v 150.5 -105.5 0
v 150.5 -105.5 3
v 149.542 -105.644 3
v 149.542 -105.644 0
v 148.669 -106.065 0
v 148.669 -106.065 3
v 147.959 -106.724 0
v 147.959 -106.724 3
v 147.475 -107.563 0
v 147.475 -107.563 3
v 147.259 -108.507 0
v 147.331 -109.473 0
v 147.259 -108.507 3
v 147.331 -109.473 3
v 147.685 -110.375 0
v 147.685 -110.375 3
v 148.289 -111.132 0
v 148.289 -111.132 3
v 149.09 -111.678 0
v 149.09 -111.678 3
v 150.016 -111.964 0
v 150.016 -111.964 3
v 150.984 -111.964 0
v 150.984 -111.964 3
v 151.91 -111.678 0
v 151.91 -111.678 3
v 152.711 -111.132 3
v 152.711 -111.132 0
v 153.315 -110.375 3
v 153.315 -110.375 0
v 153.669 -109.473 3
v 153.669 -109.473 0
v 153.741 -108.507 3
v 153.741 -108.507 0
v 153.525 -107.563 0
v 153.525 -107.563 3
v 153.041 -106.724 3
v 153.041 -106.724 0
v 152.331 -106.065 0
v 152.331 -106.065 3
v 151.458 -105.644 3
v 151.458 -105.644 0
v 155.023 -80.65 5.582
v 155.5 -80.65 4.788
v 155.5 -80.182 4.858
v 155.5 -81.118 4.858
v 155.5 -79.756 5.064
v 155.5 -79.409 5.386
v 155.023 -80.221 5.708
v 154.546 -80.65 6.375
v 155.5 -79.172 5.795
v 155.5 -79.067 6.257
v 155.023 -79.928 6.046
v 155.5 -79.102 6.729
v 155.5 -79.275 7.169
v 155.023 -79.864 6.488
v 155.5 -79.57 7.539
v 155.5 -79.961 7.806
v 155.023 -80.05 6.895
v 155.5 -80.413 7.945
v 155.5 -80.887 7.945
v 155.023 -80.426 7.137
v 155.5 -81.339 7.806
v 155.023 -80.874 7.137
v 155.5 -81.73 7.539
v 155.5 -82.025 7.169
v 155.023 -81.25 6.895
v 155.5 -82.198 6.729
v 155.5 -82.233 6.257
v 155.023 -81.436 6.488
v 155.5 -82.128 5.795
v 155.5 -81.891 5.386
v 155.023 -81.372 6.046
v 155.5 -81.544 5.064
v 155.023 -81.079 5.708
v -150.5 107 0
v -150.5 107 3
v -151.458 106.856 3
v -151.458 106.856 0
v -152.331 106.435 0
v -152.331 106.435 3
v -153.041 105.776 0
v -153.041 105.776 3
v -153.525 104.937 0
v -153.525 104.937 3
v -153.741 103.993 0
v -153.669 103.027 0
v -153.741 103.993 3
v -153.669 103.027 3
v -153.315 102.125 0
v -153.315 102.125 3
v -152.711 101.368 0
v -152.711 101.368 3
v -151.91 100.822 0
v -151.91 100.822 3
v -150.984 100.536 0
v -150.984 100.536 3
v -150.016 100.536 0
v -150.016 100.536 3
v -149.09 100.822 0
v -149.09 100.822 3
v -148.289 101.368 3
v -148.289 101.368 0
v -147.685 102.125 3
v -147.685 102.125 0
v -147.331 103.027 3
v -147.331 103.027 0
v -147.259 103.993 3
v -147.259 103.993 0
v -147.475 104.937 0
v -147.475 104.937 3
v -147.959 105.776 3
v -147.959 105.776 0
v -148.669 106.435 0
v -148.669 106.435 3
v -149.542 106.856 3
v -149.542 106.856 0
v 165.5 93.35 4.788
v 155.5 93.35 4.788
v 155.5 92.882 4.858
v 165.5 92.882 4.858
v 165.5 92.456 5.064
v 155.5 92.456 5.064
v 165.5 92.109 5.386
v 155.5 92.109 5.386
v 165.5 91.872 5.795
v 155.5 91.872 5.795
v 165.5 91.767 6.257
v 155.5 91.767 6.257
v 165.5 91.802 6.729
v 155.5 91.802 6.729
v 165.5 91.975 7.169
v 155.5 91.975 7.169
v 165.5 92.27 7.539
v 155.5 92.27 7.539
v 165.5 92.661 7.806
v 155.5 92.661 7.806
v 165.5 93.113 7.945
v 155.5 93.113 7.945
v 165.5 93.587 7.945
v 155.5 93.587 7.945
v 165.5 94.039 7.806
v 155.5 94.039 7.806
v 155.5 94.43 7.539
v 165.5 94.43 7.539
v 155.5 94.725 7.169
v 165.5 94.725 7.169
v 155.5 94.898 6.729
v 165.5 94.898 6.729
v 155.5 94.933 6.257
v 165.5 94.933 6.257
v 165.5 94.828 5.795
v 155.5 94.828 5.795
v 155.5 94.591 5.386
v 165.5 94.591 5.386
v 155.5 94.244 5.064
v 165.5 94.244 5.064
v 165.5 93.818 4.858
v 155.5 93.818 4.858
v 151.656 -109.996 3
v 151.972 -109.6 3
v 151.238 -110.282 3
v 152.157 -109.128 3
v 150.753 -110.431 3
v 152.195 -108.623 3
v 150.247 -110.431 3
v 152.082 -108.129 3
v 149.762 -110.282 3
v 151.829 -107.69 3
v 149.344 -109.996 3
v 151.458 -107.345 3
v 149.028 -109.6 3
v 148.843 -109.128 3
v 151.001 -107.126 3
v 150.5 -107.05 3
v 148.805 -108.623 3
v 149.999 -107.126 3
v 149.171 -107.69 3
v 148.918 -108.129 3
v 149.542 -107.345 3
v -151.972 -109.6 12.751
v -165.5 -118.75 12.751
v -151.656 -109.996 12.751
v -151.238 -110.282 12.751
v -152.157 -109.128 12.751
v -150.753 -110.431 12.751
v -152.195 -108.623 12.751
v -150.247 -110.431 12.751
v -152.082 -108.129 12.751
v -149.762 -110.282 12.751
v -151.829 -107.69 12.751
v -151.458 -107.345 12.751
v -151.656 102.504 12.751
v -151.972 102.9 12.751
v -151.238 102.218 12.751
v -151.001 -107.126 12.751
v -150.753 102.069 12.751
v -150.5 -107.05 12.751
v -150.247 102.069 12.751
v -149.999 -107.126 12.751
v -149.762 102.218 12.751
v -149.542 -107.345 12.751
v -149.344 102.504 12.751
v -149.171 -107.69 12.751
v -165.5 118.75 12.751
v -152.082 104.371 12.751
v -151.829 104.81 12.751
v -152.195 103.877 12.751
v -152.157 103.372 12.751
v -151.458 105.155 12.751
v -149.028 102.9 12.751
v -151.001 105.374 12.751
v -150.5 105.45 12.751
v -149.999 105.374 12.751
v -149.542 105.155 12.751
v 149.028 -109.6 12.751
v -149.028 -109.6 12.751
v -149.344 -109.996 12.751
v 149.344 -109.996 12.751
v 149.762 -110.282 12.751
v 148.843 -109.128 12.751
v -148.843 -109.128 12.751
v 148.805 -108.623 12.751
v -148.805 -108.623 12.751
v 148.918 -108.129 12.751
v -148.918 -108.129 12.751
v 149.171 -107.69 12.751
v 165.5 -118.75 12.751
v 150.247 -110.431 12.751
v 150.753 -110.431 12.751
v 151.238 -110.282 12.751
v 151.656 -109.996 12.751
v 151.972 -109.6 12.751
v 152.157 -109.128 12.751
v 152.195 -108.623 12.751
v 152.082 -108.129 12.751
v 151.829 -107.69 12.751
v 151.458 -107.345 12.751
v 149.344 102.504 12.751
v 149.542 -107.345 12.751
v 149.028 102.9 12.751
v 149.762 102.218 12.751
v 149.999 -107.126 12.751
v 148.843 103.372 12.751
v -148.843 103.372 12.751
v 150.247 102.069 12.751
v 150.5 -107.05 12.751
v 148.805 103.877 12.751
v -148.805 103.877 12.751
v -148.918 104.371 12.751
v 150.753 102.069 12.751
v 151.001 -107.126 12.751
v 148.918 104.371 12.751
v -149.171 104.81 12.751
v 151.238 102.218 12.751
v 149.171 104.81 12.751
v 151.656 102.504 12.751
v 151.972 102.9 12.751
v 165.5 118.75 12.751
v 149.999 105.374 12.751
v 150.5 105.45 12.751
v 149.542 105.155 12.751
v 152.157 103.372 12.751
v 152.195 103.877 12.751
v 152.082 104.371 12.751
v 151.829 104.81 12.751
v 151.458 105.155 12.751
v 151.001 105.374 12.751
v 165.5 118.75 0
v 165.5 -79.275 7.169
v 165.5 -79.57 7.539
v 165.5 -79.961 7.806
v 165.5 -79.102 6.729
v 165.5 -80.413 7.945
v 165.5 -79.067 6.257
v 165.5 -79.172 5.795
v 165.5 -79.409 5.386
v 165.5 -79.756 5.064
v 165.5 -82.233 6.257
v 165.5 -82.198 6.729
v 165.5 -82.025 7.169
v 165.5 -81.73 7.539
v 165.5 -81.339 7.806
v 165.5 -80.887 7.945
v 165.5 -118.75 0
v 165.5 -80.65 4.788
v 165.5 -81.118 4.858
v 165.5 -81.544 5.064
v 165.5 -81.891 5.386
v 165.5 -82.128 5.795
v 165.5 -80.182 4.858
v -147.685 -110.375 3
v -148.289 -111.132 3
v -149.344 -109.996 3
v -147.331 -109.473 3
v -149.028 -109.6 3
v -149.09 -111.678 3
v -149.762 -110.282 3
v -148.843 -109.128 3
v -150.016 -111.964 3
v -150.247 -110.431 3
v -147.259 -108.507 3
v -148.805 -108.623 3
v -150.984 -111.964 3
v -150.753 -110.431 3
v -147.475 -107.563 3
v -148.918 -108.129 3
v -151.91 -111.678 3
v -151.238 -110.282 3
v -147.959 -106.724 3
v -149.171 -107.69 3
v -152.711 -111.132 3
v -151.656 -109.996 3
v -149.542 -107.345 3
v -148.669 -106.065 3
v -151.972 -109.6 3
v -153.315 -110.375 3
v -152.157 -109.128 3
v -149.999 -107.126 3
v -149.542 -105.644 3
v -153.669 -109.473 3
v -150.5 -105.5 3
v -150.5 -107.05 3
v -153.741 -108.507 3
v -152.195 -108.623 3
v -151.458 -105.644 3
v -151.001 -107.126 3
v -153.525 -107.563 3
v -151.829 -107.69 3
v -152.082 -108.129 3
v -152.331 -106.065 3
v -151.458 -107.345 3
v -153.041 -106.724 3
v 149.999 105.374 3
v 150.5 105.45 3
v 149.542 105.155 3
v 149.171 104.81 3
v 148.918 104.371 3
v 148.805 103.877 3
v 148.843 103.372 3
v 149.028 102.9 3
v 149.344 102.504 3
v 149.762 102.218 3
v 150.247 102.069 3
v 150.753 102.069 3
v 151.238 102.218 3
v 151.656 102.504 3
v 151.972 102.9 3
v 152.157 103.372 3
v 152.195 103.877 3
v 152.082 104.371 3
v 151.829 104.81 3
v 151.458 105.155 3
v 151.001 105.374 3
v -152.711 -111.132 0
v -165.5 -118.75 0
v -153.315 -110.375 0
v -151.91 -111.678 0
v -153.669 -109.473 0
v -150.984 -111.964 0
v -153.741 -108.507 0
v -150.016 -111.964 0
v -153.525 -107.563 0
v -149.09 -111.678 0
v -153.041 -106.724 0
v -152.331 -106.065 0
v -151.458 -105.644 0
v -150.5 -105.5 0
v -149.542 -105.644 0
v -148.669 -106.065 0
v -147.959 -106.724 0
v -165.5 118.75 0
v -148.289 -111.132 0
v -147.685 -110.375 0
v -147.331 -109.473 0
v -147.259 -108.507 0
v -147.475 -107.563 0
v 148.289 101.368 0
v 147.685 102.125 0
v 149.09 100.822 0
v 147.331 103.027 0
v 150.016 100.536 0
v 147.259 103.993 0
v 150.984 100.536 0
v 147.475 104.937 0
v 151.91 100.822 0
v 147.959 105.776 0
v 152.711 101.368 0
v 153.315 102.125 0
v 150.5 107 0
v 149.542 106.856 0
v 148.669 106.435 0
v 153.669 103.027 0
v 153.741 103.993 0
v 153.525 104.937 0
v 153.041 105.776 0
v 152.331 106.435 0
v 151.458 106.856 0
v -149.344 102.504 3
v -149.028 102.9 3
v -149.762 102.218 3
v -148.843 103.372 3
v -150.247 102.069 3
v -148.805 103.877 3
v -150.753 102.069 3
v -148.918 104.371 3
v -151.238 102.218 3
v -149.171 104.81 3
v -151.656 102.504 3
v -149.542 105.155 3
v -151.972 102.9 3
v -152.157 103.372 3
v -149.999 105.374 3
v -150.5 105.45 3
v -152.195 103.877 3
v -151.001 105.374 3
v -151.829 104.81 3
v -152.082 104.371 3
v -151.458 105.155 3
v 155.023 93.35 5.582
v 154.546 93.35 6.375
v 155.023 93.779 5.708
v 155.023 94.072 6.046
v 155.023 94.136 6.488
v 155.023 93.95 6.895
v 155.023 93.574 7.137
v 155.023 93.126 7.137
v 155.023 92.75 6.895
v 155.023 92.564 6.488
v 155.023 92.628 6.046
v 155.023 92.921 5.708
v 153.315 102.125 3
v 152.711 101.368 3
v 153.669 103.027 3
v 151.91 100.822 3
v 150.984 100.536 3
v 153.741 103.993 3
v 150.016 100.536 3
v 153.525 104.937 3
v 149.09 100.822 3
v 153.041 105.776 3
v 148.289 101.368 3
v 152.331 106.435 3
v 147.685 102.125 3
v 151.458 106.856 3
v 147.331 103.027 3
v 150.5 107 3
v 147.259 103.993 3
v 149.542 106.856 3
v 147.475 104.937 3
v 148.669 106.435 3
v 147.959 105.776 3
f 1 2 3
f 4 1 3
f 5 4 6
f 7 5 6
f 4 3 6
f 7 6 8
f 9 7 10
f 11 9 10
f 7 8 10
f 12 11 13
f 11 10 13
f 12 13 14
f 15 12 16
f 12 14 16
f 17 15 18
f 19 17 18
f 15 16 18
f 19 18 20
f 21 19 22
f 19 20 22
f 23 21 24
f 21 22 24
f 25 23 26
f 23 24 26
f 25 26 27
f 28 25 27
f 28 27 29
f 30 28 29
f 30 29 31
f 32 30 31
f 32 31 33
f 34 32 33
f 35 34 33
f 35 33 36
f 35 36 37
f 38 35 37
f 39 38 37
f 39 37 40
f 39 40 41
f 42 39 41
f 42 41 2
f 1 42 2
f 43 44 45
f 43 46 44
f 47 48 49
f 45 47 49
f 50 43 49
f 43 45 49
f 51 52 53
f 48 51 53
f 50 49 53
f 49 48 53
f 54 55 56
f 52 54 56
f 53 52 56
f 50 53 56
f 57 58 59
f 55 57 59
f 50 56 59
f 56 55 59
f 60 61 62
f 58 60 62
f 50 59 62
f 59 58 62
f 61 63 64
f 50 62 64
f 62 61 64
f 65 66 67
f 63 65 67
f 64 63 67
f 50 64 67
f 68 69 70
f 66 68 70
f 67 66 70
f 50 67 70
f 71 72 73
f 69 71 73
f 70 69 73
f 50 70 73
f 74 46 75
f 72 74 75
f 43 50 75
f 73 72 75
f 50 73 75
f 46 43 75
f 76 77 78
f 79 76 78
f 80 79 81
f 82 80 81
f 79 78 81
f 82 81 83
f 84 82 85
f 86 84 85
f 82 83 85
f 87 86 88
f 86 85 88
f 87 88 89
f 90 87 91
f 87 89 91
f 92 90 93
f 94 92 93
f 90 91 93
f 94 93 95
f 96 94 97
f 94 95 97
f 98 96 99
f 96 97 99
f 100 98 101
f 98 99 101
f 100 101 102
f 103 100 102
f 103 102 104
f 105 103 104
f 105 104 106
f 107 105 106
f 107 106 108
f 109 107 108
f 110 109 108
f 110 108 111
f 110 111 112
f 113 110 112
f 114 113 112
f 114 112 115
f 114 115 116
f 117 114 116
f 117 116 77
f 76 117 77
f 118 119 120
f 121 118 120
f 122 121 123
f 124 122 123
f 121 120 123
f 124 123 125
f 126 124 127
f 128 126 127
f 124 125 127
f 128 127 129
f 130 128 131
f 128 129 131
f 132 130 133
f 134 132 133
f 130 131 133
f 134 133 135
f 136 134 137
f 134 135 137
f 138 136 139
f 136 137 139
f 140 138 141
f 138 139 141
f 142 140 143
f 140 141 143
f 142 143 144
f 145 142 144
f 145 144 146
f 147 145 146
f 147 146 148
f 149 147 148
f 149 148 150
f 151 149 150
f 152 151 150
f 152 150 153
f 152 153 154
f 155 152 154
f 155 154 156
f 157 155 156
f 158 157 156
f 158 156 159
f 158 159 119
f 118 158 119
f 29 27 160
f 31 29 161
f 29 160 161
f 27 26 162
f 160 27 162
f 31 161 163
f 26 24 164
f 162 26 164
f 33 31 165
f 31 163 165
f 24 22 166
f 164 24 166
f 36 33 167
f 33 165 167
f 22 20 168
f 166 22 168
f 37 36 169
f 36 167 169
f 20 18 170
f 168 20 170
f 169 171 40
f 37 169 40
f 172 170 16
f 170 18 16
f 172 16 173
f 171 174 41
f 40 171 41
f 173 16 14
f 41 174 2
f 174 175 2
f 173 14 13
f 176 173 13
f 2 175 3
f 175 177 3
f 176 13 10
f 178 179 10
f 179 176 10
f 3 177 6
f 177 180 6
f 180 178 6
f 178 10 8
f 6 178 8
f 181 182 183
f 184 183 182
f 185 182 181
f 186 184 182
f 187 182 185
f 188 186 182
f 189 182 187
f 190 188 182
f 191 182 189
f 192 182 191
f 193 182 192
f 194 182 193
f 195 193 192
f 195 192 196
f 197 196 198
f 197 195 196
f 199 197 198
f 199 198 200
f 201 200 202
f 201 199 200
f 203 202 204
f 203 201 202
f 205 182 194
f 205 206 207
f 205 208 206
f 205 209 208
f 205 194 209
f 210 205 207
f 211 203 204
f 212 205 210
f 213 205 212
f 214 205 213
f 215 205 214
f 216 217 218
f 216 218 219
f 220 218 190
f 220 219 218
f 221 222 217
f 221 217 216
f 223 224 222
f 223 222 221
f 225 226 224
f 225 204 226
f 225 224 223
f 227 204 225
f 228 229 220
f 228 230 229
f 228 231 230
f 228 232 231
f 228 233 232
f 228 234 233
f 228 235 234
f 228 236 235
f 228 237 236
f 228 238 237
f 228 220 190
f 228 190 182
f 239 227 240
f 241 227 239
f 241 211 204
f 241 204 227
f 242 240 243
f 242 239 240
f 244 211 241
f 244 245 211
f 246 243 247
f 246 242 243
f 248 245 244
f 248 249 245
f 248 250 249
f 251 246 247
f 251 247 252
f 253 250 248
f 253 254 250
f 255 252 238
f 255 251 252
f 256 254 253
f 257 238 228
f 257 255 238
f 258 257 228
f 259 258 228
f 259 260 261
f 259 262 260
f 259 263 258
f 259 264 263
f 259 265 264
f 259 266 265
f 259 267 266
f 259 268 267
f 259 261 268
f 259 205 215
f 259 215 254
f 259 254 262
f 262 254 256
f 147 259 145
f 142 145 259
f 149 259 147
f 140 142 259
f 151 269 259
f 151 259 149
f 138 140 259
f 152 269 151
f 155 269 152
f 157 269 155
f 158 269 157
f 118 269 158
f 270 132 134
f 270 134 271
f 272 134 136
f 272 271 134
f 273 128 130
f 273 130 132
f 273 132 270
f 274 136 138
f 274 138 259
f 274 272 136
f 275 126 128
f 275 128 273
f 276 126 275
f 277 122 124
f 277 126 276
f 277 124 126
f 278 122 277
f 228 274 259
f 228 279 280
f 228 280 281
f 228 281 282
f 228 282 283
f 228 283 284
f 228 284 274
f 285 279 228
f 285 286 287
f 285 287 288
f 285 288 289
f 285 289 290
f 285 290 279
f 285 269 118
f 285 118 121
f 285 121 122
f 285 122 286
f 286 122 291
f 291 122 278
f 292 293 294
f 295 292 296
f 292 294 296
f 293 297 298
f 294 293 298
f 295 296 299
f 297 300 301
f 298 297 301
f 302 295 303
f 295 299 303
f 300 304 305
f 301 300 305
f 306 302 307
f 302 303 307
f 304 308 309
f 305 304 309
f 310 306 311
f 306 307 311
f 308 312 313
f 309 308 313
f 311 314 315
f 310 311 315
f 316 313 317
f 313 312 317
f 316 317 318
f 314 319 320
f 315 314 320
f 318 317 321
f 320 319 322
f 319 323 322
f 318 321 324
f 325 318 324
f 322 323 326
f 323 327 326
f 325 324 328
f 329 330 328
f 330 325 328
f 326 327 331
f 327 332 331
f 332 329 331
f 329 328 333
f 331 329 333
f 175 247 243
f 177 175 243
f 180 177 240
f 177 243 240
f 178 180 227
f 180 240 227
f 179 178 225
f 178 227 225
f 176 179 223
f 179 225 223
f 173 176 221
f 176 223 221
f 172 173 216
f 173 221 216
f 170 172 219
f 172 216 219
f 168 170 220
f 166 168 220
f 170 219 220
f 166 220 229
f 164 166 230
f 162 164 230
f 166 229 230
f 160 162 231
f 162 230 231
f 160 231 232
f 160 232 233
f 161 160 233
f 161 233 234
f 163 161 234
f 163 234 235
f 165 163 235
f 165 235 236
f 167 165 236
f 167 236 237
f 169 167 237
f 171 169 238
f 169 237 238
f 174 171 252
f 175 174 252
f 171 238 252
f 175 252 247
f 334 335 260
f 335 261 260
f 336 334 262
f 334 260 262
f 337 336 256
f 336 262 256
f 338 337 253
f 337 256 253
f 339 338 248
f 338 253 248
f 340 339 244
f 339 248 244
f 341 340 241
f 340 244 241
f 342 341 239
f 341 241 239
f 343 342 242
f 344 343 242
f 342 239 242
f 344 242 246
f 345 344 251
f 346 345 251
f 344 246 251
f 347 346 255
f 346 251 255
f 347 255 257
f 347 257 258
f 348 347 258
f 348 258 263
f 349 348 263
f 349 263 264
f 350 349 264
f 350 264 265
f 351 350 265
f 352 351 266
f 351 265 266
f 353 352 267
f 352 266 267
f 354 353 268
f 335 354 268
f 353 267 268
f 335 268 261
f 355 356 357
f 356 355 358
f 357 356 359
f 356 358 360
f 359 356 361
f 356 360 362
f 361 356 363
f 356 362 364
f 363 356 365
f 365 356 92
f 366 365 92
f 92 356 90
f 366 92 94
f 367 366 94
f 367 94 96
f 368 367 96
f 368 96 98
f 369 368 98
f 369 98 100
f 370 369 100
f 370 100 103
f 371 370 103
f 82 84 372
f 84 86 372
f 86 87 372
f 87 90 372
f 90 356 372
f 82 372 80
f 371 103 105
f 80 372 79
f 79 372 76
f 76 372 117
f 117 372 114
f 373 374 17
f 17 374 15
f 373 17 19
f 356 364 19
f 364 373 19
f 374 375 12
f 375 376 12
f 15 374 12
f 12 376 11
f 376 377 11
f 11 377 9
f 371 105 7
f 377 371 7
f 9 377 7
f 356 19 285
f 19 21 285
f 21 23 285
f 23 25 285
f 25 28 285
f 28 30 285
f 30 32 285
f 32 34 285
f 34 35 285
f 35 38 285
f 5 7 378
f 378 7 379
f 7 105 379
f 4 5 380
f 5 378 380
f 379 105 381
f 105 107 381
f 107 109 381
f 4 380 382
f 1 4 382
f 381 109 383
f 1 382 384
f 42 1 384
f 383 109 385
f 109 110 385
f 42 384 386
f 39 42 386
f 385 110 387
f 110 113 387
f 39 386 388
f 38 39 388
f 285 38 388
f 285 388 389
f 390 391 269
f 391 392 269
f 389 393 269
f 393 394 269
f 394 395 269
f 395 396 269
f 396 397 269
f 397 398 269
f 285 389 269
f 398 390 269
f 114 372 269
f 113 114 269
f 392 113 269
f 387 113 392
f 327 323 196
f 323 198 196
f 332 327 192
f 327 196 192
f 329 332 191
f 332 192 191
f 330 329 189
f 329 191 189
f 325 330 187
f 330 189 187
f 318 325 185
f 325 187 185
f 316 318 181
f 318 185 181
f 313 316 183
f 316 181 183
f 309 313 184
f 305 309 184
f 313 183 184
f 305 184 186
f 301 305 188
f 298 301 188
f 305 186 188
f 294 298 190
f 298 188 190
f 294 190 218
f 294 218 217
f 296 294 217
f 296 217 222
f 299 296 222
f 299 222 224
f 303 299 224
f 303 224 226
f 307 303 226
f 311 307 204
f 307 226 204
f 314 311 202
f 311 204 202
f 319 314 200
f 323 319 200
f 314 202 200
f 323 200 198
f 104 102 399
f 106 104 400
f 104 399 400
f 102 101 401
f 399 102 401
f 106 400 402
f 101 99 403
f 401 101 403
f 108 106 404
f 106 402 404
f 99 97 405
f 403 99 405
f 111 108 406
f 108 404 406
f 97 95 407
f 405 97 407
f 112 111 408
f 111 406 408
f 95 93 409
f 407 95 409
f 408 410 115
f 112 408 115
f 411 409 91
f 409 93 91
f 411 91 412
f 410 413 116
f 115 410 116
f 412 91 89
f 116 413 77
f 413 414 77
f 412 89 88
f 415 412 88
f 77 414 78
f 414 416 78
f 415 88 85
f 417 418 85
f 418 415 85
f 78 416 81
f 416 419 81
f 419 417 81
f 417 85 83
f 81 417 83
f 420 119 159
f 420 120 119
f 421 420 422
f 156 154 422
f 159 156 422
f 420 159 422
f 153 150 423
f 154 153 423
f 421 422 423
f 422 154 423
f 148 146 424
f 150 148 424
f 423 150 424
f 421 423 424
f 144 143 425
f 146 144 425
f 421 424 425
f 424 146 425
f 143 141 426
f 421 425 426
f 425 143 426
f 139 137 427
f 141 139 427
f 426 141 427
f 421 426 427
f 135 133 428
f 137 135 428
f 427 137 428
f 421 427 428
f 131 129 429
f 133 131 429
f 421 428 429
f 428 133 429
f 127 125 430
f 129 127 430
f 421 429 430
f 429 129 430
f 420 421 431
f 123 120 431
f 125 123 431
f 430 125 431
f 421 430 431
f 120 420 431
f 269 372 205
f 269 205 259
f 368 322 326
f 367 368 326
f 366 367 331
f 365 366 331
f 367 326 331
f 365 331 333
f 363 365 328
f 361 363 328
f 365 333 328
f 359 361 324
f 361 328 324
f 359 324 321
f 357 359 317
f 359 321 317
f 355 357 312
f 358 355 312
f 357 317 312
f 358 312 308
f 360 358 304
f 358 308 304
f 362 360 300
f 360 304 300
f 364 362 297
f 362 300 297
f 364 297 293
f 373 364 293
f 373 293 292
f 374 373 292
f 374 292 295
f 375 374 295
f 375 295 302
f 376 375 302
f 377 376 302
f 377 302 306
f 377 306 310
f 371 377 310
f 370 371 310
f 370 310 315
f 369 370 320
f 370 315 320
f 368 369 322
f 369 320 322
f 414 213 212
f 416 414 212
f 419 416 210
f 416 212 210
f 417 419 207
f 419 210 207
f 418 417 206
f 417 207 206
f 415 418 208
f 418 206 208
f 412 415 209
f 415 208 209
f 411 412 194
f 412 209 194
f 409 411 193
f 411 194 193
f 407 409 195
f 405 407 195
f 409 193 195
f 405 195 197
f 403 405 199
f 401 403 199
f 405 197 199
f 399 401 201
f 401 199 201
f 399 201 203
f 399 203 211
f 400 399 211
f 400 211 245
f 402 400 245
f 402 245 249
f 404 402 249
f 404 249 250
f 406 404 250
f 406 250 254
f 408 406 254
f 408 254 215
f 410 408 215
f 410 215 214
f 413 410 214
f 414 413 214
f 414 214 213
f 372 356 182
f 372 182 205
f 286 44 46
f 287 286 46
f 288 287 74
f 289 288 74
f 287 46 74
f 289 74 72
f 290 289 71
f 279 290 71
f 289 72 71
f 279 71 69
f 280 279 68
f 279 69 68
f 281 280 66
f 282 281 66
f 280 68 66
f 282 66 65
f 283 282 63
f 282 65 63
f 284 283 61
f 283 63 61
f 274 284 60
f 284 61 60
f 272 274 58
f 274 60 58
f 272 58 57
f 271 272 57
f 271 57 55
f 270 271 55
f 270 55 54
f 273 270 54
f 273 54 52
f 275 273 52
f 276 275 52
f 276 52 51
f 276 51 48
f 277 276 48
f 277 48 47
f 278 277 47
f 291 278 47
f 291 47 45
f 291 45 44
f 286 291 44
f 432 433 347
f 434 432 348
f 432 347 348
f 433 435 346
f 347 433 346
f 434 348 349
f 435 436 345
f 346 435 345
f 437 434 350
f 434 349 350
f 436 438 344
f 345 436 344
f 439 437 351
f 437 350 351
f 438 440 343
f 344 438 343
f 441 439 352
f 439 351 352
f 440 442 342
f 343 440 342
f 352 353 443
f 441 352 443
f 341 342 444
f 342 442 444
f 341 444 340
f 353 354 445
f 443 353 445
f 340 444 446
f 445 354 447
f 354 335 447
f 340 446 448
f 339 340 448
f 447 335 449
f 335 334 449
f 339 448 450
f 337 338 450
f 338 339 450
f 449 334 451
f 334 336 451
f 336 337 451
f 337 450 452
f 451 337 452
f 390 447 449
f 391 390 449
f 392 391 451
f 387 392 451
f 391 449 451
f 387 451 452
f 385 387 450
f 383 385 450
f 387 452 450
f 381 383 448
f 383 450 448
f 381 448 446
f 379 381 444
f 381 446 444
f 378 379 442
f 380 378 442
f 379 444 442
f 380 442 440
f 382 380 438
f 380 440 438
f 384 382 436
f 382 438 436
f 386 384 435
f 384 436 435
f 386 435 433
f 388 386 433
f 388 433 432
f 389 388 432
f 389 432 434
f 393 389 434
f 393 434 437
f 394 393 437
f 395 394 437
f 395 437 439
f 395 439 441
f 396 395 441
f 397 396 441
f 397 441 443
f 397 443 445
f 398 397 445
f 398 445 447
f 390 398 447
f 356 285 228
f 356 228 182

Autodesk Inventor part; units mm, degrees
ref_plane "YZ Plane" through (0, 0, 0) normal (1, 0, 0) x (0, 1, 0)
ref_plane "XZ Plane" through (0, 0, 0) normal (0, 1, 0) x (-1, 0, 0)
ref_plane "XY Plane" through (0, 0, 0) normal (0, 0, 1) x (1, 0, 0)
sketch "Sketch1" plane through (0, 0, 0) normal (0, 0, 1) x (1, 0, 0)
  line L0 (-165.5, 118.75) -> (165.5, 118.75)
  line L1 (165.5, 118.75) -> (165.5, -118.75)
  line L2 (165.5, -118.75) -> (-165.5, -118.75)
  line L3 (-165.5, -118.75) -> (-165.5, 118.75)
  point P0 (0, 0)
  point P1 (-165.5, 0)
  point P2 (0, 118.75)
  dimension "d0" = 331
  dimension "d2" = 237.5
extrude "Extrusion1" add sketch "Sketch1" along normal blind 12.7508
sketch "Sketch2" plane through (0, 0, 0) normal (0, 0, -1) x (-1, 0, 0)
  circle A0 centre (-150.5, 103.75) radius 1.55 projected
  line L0 (-145.8379, -108.9576) -> (-147.4259, -106.1413) projected
  circle A1 centre (150.5, -108.75) radius 1.55 projected
  circle A2 centre (150.5, 103.75) radius 1.55 projected
  line L1 (150.5, -108.75) -> (-150.5, -108.75)
  line L2 (-150.5, -108.75) -> (-150.5, 103.75)
  line L3 (-150.5, 103.75) -> (150.5, 103.75)
  line L4 (150.5, 103.75) -> (150.5, -108.75)
  circle A3 centre (-150.5, -108.75) radius 1.55
  point P0 (0, 0)
extrude "Extrusion2" cut sketch "Sketch2" against normal through all contours L3 L2 A0 | A0 L2 L3 | L3 L4 A2 | A2 L4 L3 | A3 L1 L2 | L2 L1 A3 | L4 L1 A1 | A1 L1 L4
sketch "Sketch3" plane through (0, 0, 0) normal (0, 0, -1) x (-1, 0, 0)
  circle A0 centre (150.5, -108.75) radius 1.55
  circle A1 centre (-150.5, 103.75) radius 1.55
  circle A2 centre (-150.5, -108.75) radius 1.55
  circle A3 centre (150.5, 103.75) radius 1.55
  circle A4 centre (-150.5, 103.75) radius 3.25
  circle A5 centre (-150.5, -108.75) radius 3.25
  circle A6 centre (150.5, -108.75) radius 3.25
  circle A7 centre (150.5, 103.75) radius 3.25
  circle A8 centre (-150.5, -108.75) radius 1.55 projected
  point P0 (0, 0)
  dimension "d7" = 6.5
hole "Hole1" at (150.5, 103.75, 0) at (150.5, -108.75, 0) at (-150.5, -108.75, 0) at (-150.5, 103.75, 0) direction (0, 0, 1) diameter 3.4 end through all counterbore diameter 6.5 counterbore depth 3 clearance for "Socket Head Cap Screw" size "M3" standard "Ansi Metric M Profile"
sketch "Sketch4" plane through (0, 0, 0) normal (0, 0, -1) x (-1, 0, 0)
  circle A0 centre (-2, -73.75) radius 1.621 projected
  circle A1 centre (48, 76.25) radius 1.621 projected
  circle A2 centre (-2, 76.25) radius 1.621 projected
  circle A3 centre (48, -73.75) radius 1.621 projected
  line L0 (-34.5, 108.75) -> (-34.5, -106.25) projected
  line L1 (-34.5, -106.25) -> (80.5, -106.25) projected
  line L2 (80.5, -106.25) -> (80.5, 108.75) projected
  line L3 (80.5, 108.75) -> (-34.5, 108.75) projected
  point P0 (0, 0)
hole "Hole2" [suppressed]
sketch "Sketch5" plane through (0, 0, 0) normal (0, 0, -1) x (-1, 0, 0)
  circle A0 centre (-143.139, 21.4425) radius 1.7 projected
  circle A1 centre (-52.461, 65.2575) radius 1.7 projected
  circle A2 centre (-143.139, 65.2575) radius 1.7 projected
  circle A3 centre (-52.461, 21.4425) radius 1.7 projected
  line L0 (-47, 17.95) -> (-148.6, 17.95) projected
  line L1 (-47, 68.75) -> (-47, 17.95) projected
  line L2 (-148.6, 68.75) -> (-47, 68.75) projected
  line L3 (-148.6, 17.95) -> (-148.6, 68.75) projected
  point P0 (0, 0)
hole "Hole3" [suppressed]
sketch "Sketch6" plane through (165.5, -118.75, 0) normal (1, 0, 0) x (0, 0, -1)
  line L0 (0, 237.5) -> (-12.7508, 237.5) projected
  line L1 (0, 0) -> (-12.7508, 0) projected
  line L2 (-6.3754, 237.5) -> (-6.3754, 0) construction
  point P0 (0, 118.75)
  point P1 (-6.3754, 212.1)
  point P2 (-6.3754, 38.1)
  dimension "d30" = 25.4
  dimension "d31" = 38.1
hole "Hole4" at (165.5, 93.35, 6.3754) at (165.5, -80.65, 6.3754) direction (-1, 0, 0) diameter 3.175 depth 10 tip angle 118
properties part number "bottom"
